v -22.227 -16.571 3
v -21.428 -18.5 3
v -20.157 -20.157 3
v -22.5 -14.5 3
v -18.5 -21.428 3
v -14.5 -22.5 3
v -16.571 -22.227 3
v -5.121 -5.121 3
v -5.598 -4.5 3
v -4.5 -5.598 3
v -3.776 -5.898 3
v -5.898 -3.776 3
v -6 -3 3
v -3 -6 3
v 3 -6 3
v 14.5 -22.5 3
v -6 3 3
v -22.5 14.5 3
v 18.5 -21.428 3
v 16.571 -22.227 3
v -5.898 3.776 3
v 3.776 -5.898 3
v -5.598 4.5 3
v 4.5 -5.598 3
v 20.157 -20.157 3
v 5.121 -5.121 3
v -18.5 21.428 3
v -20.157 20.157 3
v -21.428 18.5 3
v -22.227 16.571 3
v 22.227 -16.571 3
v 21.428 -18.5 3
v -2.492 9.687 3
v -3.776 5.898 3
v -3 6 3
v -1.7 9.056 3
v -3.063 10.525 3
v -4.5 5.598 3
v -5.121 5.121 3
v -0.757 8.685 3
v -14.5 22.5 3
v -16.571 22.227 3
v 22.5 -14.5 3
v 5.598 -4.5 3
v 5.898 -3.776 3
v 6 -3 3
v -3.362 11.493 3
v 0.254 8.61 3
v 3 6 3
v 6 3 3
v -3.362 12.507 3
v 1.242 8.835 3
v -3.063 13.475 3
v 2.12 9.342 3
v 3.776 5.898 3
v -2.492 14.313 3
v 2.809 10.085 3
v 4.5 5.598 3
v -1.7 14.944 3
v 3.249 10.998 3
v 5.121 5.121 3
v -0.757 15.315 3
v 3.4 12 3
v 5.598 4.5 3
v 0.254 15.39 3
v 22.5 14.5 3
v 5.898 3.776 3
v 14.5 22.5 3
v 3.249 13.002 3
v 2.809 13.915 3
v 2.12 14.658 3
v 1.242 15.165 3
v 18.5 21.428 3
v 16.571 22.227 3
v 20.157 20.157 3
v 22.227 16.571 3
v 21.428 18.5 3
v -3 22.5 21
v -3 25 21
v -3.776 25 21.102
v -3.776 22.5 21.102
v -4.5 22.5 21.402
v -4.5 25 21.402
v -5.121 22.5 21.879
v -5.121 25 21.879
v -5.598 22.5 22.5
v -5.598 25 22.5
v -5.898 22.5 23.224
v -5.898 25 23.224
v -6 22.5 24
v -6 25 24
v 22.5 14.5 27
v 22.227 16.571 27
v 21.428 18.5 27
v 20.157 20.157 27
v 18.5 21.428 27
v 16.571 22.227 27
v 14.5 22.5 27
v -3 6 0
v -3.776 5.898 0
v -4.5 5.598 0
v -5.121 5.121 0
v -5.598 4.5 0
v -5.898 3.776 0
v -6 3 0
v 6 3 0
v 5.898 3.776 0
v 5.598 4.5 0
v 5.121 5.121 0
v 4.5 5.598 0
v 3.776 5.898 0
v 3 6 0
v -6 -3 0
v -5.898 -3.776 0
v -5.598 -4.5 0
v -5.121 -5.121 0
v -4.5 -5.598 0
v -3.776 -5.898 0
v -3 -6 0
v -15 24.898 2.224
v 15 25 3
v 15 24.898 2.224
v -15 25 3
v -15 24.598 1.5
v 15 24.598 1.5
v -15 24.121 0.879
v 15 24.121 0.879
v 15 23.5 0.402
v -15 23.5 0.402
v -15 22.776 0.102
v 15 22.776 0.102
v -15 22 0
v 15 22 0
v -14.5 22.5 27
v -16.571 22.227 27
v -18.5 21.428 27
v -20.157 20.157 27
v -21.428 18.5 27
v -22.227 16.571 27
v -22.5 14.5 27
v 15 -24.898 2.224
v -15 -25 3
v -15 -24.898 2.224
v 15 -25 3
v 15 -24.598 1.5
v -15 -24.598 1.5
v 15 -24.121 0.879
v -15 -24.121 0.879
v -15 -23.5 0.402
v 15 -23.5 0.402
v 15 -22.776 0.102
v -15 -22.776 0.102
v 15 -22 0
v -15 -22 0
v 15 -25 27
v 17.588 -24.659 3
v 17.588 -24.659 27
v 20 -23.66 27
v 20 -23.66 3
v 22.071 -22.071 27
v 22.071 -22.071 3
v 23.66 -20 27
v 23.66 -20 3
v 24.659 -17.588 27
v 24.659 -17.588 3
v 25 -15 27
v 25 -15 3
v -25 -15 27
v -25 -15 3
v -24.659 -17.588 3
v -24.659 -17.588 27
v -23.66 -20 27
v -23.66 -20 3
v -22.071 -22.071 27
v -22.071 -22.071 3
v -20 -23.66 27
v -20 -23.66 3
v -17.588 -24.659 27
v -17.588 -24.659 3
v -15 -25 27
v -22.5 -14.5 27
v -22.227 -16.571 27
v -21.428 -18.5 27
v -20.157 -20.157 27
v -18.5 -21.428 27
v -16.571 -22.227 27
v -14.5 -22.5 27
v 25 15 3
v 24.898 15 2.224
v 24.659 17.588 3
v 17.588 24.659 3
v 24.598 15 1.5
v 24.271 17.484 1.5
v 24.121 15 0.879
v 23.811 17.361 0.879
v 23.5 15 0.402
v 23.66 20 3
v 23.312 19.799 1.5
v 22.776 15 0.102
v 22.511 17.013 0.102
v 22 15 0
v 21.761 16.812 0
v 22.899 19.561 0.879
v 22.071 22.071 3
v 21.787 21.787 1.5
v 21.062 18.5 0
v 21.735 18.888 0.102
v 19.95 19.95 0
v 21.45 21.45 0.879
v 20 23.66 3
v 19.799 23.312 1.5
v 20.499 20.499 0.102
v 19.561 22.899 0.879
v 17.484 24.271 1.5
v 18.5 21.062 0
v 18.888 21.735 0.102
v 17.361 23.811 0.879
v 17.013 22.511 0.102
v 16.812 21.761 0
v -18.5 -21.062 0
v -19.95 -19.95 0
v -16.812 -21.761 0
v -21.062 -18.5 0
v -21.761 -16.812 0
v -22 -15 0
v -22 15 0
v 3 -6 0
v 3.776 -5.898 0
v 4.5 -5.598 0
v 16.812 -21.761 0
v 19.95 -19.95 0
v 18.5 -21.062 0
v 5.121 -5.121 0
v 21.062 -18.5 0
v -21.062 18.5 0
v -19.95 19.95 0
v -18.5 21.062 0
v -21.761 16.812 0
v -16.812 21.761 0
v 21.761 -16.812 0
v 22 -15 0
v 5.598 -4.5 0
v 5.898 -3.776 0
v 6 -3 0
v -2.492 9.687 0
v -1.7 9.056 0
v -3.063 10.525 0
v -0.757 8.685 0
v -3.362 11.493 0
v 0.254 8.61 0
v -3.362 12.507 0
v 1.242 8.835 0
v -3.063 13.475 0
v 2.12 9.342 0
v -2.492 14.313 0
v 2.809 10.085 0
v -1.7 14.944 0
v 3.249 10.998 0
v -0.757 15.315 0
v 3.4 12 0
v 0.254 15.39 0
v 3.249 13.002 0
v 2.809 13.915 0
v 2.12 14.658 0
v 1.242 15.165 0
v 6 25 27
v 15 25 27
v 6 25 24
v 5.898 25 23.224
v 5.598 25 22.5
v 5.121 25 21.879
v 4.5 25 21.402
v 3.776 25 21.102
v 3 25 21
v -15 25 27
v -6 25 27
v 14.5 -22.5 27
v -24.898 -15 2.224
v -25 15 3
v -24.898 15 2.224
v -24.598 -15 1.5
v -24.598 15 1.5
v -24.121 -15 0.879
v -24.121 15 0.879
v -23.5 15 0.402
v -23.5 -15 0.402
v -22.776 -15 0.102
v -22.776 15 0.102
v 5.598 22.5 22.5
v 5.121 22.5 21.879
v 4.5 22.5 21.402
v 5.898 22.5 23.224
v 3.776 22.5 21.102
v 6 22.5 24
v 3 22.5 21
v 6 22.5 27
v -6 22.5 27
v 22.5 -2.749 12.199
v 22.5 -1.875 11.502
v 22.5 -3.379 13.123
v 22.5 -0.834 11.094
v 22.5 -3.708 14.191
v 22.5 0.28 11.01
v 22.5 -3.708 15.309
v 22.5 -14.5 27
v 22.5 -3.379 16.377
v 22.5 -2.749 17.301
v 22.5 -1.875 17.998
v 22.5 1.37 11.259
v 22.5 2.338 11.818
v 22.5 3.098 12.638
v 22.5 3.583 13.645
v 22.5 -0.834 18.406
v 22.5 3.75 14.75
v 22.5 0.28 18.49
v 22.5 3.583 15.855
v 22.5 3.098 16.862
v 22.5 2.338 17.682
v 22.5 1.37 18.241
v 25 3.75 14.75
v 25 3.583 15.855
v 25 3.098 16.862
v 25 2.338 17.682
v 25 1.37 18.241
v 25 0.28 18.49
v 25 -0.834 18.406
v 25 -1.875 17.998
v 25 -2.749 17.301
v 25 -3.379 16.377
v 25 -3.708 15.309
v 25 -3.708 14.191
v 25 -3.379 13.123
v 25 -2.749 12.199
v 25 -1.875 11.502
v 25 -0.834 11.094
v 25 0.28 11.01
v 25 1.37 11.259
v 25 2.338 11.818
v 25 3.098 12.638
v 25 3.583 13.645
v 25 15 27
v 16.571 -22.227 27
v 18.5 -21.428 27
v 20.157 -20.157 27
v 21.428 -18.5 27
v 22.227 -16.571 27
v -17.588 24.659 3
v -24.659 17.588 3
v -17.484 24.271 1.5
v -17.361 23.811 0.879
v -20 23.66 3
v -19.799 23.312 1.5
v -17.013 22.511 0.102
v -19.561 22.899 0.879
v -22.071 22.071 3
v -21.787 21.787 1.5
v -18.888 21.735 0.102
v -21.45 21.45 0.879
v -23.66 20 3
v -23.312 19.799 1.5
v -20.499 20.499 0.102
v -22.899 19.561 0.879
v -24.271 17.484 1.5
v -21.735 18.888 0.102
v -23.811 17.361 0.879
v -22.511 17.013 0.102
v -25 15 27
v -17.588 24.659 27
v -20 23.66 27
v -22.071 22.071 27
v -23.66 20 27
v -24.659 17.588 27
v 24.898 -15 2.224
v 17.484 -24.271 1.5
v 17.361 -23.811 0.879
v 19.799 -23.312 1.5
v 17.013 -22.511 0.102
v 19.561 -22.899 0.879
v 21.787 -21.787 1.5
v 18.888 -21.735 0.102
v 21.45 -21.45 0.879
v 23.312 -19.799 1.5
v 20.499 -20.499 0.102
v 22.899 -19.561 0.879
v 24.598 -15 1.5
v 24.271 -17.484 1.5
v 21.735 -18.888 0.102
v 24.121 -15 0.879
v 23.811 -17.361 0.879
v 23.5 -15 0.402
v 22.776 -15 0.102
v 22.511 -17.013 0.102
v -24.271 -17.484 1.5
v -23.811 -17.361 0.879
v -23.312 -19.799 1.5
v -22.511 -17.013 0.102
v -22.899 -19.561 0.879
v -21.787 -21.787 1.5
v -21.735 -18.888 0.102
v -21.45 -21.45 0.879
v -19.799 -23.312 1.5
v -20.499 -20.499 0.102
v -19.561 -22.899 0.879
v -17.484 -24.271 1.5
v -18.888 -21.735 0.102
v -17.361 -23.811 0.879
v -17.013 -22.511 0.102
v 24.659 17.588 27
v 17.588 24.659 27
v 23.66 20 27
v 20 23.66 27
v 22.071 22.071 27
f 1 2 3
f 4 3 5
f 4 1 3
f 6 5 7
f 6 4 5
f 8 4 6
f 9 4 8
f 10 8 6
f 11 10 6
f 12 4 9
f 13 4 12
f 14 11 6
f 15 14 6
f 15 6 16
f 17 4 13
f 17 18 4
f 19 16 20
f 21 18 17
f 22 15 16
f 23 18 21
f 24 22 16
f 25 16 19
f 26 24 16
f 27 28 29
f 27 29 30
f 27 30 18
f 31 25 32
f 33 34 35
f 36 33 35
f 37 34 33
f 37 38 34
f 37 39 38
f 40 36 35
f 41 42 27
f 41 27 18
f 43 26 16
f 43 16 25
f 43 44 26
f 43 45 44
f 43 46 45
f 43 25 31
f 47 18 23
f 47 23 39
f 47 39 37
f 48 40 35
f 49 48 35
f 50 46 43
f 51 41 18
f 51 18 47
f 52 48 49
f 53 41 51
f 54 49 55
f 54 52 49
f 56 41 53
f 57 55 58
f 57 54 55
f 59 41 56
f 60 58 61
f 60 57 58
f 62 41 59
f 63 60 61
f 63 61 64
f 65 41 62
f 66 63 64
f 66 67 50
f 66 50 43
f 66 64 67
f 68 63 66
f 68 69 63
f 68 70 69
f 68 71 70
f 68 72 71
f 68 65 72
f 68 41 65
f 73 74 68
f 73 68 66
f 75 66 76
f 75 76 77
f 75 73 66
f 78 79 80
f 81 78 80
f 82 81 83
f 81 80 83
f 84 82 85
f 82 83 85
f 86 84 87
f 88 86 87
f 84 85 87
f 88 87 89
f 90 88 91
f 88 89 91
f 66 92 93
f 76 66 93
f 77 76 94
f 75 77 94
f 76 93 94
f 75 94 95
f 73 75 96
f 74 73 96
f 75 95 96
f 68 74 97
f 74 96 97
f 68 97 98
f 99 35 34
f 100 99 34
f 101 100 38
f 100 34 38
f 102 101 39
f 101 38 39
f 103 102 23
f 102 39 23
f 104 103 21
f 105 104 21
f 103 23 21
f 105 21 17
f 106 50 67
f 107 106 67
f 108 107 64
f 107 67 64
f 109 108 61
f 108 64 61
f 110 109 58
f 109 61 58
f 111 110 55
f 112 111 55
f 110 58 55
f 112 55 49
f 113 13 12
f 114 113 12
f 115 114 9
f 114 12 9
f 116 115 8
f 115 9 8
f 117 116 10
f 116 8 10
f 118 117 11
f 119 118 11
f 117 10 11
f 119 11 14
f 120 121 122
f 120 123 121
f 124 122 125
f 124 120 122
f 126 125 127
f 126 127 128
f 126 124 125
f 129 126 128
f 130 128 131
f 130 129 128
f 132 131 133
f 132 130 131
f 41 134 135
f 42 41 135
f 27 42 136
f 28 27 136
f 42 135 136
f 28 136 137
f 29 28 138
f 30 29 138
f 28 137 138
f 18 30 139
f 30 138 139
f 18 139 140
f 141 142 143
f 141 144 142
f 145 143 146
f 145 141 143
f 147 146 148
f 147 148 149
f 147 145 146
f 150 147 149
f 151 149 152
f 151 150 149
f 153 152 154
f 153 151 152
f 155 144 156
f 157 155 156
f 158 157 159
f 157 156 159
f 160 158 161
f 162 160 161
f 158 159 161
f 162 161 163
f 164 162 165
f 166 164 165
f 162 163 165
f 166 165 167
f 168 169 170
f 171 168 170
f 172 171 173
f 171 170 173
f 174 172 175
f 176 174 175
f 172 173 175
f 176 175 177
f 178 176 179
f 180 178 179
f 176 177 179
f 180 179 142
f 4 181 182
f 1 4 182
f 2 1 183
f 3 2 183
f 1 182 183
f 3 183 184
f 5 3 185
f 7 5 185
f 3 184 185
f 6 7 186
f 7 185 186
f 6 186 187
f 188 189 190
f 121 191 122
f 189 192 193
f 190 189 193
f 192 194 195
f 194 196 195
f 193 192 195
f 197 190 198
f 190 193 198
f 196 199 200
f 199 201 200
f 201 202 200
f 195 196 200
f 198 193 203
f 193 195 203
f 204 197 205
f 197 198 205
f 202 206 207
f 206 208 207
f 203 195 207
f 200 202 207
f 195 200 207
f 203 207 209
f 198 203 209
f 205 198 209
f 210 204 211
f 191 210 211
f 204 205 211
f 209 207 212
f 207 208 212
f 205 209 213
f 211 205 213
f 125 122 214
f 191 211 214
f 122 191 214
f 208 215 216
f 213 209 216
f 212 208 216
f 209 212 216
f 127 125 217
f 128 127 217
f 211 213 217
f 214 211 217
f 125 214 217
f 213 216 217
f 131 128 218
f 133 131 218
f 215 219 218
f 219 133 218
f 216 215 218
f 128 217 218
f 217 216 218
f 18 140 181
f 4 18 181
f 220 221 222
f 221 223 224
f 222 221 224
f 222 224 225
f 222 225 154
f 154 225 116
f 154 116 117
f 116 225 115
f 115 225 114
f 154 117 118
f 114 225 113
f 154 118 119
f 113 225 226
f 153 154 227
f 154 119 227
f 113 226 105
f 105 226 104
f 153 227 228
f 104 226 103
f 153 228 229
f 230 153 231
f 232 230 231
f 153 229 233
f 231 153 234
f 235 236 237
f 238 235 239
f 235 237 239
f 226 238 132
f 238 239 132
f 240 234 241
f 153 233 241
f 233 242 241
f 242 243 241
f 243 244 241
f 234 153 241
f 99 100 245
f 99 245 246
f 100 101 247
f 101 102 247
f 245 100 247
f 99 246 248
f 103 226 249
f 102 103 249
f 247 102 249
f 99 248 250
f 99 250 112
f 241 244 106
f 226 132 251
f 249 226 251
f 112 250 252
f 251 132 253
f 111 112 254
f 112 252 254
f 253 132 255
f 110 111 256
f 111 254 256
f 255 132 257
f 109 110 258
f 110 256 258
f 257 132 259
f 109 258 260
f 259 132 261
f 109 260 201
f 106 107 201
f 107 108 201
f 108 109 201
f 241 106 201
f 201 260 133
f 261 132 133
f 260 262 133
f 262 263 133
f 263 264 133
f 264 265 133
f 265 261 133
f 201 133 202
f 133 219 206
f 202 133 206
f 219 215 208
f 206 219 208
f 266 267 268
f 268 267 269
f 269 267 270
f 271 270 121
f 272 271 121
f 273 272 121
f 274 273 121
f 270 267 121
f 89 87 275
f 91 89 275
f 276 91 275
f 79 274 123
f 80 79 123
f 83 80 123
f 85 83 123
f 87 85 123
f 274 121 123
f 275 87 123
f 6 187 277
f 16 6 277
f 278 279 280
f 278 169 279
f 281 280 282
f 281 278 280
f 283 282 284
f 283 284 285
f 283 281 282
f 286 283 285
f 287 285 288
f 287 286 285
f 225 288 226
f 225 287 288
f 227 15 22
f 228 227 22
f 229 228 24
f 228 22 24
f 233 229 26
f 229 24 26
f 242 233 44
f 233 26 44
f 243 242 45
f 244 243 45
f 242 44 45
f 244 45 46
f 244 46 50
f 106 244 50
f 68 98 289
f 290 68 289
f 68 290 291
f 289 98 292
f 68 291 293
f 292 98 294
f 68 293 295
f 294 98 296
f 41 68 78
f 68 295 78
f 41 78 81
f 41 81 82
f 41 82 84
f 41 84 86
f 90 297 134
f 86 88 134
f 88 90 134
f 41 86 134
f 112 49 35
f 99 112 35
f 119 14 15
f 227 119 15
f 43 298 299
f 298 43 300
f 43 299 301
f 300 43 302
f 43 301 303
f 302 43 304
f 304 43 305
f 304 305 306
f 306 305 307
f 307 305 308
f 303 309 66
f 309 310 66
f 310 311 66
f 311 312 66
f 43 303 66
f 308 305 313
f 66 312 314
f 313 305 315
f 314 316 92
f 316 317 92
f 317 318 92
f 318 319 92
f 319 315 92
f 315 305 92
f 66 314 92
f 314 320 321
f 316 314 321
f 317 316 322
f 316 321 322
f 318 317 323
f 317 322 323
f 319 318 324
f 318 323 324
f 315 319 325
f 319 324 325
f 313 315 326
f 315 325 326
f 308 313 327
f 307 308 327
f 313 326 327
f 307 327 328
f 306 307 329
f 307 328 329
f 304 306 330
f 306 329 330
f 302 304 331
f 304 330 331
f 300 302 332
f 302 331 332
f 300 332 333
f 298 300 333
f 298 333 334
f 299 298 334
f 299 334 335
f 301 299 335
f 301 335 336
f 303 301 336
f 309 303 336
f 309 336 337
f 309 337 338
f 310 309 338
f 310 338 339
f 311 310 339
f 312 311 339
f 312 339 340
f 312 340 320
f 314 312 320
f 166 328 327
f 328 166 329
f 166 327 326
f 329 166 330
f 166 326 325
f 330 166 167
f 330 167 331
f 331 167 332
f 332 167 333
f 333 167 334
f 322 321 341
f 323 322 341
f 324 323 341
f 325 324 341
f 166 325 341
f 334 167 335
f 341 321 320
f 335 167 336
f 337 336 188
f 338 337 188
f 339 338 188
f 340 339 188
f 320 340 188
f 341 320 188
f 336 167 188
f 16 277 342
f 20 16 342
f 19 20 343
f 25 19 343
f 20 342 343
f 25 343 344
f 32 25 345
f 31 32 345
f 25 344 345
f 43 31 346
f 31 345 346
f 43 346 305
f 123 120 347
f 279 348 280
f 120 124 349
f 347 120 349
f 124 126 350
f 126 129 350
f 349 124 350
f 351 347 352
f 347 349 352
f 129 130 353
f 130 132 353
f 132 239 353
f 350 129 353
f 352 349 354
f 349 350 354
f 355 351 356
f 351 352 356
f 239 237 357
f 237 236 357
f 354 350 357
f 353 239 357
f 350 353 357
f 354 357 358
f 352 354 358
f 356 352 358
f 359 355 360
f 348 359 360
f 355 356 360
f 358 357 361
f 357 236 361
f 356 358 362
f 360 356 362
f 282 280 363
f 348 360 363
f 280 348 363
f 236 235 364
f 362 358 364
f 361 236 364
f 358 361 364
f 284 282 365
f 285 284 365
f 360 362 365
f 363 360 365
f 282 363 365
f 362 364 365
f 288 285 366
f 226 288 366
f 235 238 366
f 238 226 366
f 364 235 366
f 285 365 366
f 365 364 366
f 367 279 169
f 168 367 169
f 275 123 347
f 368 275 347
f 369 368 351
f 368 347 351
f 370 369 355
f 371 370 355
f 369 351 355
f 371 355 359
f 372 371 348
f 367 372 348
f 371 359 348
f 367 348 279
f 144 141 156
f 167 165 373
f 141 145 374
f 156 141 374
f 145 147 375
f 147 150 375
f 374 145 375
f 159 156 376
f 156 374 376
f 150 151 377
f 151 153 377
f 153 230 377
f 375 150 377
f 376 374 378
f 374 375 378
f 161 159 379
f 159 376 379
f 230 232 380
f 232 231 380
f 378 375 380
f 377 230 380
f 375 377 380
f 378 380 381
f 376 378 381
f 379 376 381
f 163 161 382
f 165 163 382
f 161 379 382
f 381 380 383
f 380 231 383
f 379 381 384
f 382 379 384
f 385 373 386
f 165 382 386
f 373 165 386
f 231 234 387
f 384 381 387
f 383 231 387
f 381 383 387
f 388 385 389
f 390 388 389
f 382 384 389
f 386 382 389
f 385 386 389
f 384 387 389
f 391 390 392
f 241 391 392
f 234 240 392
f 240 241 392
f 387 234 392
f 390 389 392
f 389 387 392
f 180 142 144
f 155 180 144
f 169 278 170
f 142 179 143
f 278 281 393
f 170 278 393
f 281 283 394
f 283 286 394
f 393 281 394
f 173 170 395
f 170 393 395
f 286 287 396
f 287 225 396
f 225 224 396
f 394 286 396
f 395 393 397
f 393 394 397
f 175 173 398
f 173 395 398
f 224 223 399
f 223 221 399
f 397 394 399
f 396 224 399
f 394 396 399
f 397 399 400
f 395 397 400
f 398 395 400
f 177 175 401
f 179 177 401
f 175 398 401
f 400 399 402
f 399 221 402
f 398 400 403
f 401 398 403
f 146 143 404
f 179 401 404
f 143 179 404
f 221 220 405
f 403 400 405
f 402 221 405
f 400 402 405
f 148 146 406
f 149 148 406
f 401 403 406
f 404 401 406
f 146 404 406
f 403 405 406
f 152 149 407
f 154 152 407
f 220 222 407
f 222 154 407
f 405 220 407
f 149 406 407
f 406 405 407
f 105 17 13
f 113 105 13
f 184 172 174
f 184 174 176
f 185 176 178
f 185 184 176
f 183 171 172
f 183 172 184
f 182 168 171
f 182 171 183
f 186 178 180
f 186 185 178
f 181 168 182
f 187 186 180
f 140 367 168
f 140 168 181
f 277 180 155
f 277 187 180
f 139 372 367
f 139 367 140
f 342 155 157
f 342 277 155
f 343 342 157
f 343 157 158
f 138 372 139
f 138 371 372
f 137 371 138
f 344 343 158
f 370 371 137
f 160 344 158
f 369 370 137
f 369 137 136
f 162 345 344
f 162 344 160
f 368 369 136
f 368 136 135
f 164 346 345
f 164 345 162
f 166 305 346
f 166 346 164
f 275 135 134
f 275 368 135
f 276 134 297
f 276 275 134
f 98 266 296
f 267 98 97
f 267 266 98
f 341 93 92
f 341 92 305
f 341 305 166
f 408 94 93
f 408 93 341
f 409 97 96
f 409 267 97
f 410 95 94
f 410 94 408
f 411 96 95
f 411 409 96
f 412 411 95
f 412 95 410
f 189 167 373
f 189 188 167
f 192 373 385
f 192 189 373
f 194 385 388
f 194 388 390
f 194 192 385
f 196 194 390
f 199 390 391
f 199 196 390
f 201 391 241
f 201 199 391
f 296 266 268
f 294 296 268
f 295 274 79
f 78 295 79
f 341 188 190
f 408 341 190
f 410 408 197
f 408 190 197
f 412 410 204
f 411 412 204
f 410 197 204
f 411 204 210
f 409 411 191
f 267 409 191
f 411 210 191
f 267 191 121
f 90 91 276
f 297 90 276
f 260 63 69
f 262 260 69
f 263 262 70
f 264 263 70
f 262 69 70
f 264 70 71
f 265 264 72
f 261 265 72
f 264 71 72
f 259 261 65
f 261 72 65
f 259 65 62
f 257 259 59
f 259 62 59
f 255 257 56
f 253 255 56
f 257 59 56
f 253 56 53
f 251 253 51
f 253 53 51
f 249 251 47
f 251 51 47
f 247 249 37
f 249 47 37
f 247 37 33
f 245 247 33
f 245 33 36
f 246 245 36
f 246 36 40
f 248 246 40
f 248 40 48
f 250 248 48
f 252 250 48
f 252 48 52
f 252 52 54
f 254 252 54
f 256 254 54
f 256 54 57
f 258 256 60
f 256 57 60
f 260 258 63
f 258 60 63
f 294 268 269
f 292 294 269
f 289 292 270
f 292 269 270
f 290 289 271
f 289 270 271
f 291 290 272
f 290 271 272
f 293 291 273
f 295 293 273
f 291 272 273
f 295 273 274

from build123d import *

# Parameters (mm, degrees)
F1_DEPTH  = 27
F3_DEPTH  = 24
F5_DEPTH  = 3
F4_R      = 3.4
F6_DEPTH  = 3
F8_DEPTH  = 3
F9_R      = 3
F10_R     = 3.75
F11_DEPTH = 3


with BuildPart() as f1:
    # F0 (on Top) → F1 (new body)
    with BuildSketch(Plane.XY):
        with BuildLine():
            ThreePointArc((25, 15), (22.071068, 22.071068), (15, 25))
            Line((15, 25), (-15, 25))
            ThreePointArc((-15, 25), (-22.071068, 22.071068), (-25, 15))
            Line((-25, 15), (-25, -15))
            ThreePointArc((-25, -15), (-22.071068, -22.071068), (-15, -25))
            Line((-15, -25), (15, -25))
            ThreePointArc((15, -25), (22.071068, -22.071068), (25, -15))
            Line((25, -15), (25, 15))
        make_face()
    extrude(amount=F1_DEPTH)

    # F2 (on face) → F3 (cut)
    with BuildSketch(Plane.XY.offset(27)):
        with BuildLine():
            ThreePointArc((22.5, 14.5), (20.156854, 20.156854), (14.5, 22.5))
            Line((14.5, 22.5), (-14.5, 22.5))
            ThreePointArc((-14.5, 22.5), (-20.156854, 20.156854), (-22.5, 14.5))
            Line((-22.5, 14.5), (-22.5, -14.5))
            ThreePointArc((-22.5, -14.5), (-20.156854, -20.156854), (-14.5, -22.5))
            Line((-14.5, -22.5), (14.5, -22.5))
            ThreePointArc((14.5, -22.5), (20.156854, -20.156854), (22.5, -14.5))
            Line((22.5, -14.5), (22.5, 14.5))
        make_face()
    extrude(amount=-F3_DEPTH, mode=Mode.SUBTRACT)

    # F4 (on face) → F5 (cut)
    with BuildSketch(Plane.XY.offset(3)):
        with BuildLine():
            ThreePointArc((6, 3), (5.12132, 5.12132), (3, 6))
            Line((3, 6), (-3, 6))
            ThreePointArc((-3, 6), (-5.12132, 5.12132), (-6, 3))
            Line((-6, 3), (-6, -3))
            ThreePointArc((-6, -3), (-5.12132, -5.12132), (-3, -6))
            Line((-3, -6), (3, -6))
            ThreePointArc((3, -6), (5.12132, -5.12132), (6, -3))
            Line((6, -3), (6, 3))
        make_face()
    extrude(amount=-F5_DEPTH, mode=Mode.SUBTRACT)

    # F4 (on face) → F6 (cut)
    with BuildSketch(Plane.XY.offset(3)):
        with BuildLine():
            ThreePointArc((6, 3), (5.12132, 5.12132), (3, 6))
            Line((3, 6), (-3, 6))
            ThreePointArc((-3, 6), (-5.12132, 5.12132), (-6, 3))
            Line((-6, 3), (-6, -3))
            ThreePointArc((-6, -3), (-5.12132, -5.12132), (-3, -6))
            Line((-3, -6), (3, -6))
            ThreePointArc((3, -6), (5.12132, -5.12132), (6, -3))
            Line((6, -3), (6, 3))
        make_face()
        with Locations((0, 12)):
            Circle(F4_R)
    extrude(amount=-F6_DEPTH, mode=Mode.SUBTRACT)

    # F7 (on face) → F8 (cut)
    with BuildSketch(Plane(origin=(0, 25, 0), x_dir=(-1, 0, 0), z_dir=(0, 1, 0))):
        with BuildLine():
            Line((-3, 21), (3, 21))
            ThreePointArc((3, 21), (5.12132, 21.87868), (6, 24))
            Line((6, 24), (6, 27))
            Line((6, 27), (-6, 27))
            Line((-6, 27), (-6, 24))
            ThreePointArc((-6, 24), (-5.12132, 21.87868), (-3, 21))
        make_face()
    extrude(amount=-F8_DEPTH, mode=Mode.SUBTRACT)

    # F9
    f9_edges = [f1.edges().sort_by_distance(p)[0] for p in [
        (0, 25, 0),
    ]]
    fillet(f9_edges, radius=F9_R)

    # F10 (on face) → F11 (cut)
    with BuildSketch(Plane.YZ.offset(25)):
        with Locations((0, 14.75)):
            Circle(F10_R)
    extrude(amount=-F11_DEPTH, mode=Mode.SUBTRACT)


solid = f1.part
